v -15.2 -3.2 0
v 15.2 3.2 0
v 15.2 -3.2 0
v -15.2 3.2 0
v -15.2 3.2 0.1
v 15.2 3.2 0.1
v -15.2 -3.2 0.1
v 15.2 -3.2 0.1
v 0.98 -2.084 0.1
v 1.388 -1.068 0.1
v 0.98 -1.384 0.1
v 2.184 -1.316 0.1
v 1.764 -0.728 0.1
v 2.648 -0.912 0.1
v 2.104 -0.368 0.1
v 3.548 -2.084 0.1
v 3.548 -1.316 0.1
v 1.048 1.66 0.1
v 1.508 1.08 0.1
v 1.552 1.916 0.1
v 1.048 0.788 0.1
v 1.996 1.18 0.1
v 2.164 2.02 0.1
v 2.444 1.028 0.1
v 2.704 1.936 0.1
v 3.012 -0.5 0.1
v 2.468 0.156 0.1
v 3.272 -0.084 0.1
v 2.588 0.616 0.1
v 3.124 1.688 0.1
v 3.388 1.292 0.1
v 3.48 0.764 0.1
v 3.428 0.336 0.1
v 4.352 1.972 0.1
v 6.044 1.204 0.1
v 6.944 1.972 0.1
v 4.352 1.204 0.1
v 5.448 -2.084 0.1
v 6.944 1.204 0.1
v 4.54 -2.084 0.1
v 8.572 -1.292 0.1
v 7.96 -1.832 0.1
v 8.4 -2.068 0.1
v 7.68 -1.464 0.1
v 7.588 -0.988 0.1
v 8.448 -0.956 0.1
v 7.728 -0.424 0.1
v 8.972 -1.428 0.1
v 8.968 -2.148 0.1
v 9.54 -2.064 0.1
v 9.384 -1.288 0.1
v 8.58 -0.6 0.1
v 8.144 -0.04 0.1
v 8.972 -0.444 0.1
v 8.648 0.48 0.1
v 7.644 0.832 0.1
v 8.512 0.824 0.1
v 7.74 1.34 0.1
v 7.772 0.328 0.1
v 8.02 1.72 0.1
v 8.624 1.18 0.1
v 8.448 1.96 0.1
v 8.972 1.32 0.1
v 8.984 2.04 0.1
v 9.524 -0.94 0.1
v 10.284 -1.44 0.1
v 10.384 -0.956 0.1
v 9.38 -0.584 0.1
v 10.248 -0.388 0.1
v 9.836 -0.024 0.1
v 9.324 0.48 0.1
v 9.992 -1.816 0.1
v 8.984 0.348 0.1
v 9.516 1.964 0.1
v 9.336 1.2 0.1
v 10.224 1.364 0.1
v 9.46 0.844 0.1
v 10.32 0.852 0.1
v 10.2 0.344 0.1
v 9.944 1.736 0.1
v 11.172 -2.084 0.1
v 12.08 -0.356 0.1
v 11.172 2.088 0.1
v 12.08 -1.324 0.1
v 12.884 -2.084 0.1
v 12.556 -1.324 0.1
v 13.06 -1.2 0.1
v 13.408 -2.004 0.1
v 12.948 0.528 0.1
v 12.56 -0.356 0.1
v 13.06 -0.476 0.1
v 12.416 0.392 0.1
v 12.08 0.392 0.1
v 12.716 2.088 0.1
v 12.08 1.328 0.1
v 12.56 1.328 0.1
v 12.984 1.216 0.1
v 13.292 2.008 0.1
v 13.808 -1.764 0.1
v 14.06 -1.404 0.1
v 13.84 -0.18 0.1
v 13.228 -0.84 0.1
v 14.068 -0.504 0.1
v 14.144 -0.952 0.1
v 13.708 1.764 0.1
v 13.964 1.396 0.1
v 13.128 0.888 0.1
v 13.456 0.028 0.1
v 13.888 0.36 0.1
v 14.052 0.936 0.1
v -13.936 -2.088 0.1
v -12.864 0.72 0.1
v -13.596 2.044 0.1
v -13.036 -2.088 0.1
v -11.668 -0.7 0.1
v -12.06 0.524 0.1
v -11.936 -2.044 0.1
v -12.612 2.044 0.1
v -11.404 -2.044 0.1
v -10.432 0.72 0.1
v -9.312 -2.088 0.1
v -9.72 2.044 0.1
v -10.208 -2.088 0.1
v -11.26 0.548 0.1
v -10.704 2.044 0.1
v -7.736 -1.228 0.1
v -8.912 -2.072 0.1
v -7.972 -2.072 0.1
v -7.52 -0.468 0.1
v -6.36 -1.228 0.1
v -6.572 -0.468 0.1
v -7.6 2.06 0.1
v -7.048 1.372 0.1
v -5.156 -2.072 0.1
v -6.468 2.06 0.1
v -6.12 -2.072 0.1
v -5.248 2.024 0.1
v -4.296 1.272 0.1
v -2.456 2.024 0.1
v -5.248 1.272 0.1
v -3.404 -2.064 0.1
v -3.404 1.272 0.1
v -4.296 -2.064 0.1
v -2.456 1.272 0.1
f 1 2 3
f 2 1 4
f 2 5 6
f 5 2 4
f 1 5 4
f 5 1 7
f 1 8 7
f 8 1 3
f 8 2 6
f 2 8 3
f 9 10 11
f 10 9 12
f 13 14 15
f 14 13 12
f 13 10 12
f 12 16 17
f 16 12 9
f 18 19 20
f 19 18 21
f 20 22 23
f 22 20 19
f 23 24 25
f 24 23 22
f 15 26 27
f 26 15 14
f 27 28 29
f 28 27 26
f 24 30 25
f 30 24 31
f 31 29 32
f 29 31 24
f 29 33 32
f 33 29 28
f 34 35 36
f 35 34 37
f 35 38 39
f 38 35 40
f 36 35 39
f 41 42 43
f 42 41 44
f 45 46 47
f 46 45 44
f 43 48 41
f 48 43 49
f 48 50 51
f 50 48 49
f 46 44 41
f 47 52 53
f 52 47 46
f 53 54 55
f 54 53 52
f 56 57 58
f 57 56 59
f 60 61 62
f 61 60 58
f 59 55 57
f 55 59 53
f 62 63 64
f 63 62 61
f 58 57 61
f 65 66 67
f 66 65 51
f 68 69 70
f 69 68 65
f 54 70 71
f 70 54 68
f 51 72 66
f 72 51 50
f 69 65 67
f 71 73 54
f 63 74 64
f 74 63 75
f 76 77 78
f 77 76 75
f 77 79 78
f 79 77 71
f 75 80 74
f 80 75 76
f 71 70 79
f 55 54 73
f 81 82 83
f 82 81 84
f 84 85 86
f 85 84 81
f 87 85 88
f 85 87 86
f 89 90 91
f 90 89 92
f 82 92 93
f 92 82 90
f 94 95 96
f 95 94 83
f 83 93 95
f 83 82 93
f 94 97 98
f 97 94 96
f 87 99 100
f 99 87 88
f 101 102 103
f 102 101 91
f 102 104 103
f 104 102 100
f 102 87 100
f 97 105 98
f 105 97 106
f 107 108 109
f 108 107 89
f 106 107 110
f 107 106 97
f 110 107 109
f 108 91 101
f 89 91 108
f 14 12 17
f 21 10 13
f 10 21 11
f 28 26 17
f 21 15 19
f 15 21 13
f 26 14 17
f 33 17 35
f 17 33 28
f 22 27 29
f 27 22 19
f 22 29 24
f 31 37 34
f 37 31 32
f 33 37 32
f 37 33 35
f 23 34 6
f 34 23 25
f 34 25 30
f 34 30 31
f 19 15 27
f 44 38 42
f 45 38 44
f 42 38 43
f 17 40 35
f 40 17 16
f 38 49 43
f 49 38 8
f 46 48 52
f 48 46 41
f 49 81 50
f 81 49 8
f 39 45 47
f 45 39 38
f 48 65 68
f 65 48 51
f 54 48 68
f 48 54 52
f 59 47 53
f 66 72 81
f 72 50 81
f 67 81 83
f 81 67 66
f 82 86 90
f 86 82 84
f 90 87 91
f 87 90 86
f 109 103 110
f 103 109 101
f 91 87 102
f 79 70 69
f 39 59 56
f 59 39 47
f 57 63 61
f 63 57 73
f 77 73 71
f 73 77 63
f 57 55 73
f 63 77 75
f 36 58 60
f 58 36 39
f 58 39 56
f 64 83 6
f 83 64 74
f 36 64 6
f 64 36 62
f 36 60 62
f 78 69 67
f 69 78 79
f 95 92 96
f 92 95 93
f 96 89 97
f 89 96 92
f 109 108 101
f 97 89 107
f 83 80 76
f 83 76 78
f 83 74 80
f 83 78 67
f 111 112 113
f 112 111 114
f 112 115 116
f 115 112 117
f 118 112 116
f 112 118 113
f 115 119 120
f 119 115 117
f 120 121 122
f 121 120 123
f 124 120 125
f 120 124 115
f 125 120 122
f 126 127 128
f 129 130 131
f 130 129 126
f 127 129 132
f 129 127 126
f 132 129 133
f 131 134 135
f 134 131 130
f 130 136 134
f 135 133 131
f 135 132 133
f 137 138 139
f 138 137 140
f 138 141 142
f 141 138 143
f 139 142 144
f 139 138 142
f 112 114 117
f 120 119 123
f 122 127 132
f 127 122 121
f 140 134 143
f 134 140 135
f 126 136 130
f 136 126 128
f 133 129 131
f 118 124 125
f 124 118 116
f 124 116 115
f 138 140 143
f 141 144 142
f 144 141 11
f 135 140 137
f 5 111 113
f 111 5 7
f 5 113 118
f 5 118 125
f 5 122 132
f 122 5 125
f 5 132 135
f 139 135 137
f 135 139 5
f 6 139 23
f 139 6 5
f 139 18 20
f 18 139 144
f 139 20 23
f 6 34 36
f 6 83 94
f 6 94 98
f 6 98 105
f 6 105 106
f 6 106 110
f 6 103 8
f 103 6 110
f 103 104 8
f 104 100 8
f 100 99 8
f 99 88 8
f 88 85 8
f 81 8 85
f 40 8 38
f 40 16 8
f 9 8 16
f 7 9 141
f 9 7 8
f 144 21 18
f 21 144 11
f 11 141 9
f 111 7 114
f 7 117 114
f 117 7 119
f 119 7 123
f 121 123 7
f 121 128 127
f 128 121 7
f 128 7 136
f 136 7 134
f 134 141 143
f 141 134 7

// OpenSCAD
// file: ../p/box5-12.scad
use <../lib.scad>
function ldraw_lib__box5_12() = [
// 0 Box with 5 Faces without Any Edges
// 0 Name: box5-12.dat
// 0 Author: Chris Dee [cwdee]
// 0 !LDRAW_ORG Primitive UPDATE 2009-02
// 0 !LICENSE Licensed under CC BY 2.0 and CC BY 4.0 : see CAreadme.txt
// 
// 0 BFC CERTIFY CCW
  [0,"BFC","CERTIFY"],
  [0,"BFC","CCW"],
// 
// 0 !HISTORY 2009-09-03 [PTadmin] Official Update 2009-02
// 
// 
// 4 16 1 1 1 1 1 -1 -1 1 -1 -1 1 1
  [4,16,1,1,1,1,1,-1,-1,1,-1,-1,1,1],
// 4 16 -1 0 1 1 0 1 1 1 1 -1 1 1
  [4,16,-1,0,1,1,0,1,1,1,1,-1,1,1],
// 4 16 -1 0 -1 -1 0 1 -1 1 1 -1 1 -1
  [4,16,-1,0,-1,-1,0,1,-1,1,1,-1,1,-1],
// 4 16 1 0 -1 -1 0 -1 -1 1 -1 1 1 -1
  [4,16,1,0,-1,-1,0,-1,-1,1,-1,1,1,-1],
// 4 16 1 0 1 1 0 -1 1 1 -1 1 1 1
  [4,16,1,0,1,1,0,-1,1,1,-1,1,1,1],
// 0
];
makepoly(ldraw_lib__box5_12(), line=0.2);
// main file
use <../lib.scad>
use <../p/box5-12.scad>
function ldraw_lib__6153754i() = [
// 0 Sticker  0.8 x  3.8 with White "MAT 278B" on Black Background
// 0 Name: 6153754i.dat
// 0 Author: Magnus Forsberg [MagFors]
// 0 !LDRAW_ORG Part UPDATE 2016-01
// 0 !LICENSE Licensed under CC BY 2.0 and CC BY 4.0 : see CAreadme.txt
// 
// 0 BFC CERTIFY CCW
  [0,"BFC","CERTIFY"],
  [0,"BFC","CCW"],
// 
// 0 !KEYWORDS Beetle, set 10252, Volkswagen, VW
// 
// 0 !HISTORY 2016-12-31 [PTadmin] Official Update 2016-01
// 
// 
// 1 16 0 -0.25 0 38 0 0 0 0.25 0 0 0 8 box5-12.dat
  [1,16,0,-0.25,0,38,0,0,0,0.25,0,0,0,8, ldraw_lib__box5_12()],
// 4 15 3.47 -0.25 -2.67 2.45 -0.25 -3.46 2.45 -0.25 -5.21 5.46 -0.25 -3.29
  [4,15,3.47,-0.25,-2.67,2.45,-0.25,-3.46,2.45,-0.25,-5.21,5.46,-0.25,-3.29],
// 4 15 6.62 -0.25 -2.28 5.26 -0.25 -0.92 4.41 -0.25 -1.82 5.46 -0.25 -3.29
  [4,15,6.62,-0.25,-2.28,5.26,-0.25,-0.92,4.41,-0.25,-1.82,5.46,-0.25,-3.29],
// 3 15 4.41 -0.25 -1.82 3.47 -0.25 -2.67 5.46 -0.25 -3.29
  [3,15,4.41,-0.25,-1.82,3.47,-0.25,-2.67,5.46,-0.25,-3.29],
// 4 15 5.46 -0.25 -3.29 2.45 -0.25 -5.21 8.87 -0.25 -5.21 8.87 -0.25 -3.29
  [4,15,5.46,-0.25,-3.29,2.45,-0.25,-5.21,8.87,-0.25,-5.21,8.87,-0.25,-3.29],
// 4 15 2.62 -0.25 4.15 2.62 -0.25 1.97 3.77 -0.25 2.7 3.88 -0.25 4.79
  [4,15,2.62,-0.25,4.15,2.62,-0.25,1.97,3.77,-0.25,2.7,3.88,-0.25,4.79],
// 4 15 4.99 -0.25 2.95 5.41 -0.25 5.05 3.88 -0.25 4.79 3.77 -0.25 2.7
  [4,15,4.99,-0.25,2.95,5.41,-0.25,5.05,3.88,-0.25,4.79,3.77,-0.25,2.7],
// 4 15 5.41 -0.25 5.05 4.99 -0.25 2.95 6.11 -0.25 2.57 6.76 -0.25 4.84
  [4,15,5.41,-0.25,5.05,4.99,-0.25,2.95,6.11,-0.25,2.57,6.76,-0.25,4.84],
// 4 15 7.53 -0.25 -1.25 6.17 -0.25 0.39 5.26 -0.25 -0.92 6.62 -0.25 -2.28
  [4,15,7.53,-0.25,-1.25,6.17,-0.25,0.39,5.26,-0.25,-0.92,6.62,-0.25,-2.28],
// 4 15 6.17 -0.25 0.39 7.53 -0.25 -1.25 8.18 -0.25 -0.21 6.47 -0.25 1.54
  [4,15,6.17,-0.25,0.39,7.53,-0.25,-1.25,8.18,-0.25,-0.21,6.47,-0.25,1.54],
// 4 15 7.81 -0.25 4.22 6.76 -0.25 4.84 6.11 -0.25 2.57 8.47 -0.25 3.23
  [4,15,7.81,-0.25,4.22,6.76,-0.25,4.84,6.11,-0.25,2.57,8.47,-0.25,3.23],
// 4 15 8.47 -0.25 3.23 6.11 -0.25 2.57 6.47 -0.25 1.54 8.7 -0.25 1.91
  [4,15,8.47,-0.25,3.23,6.11,-0.25,2.57,6.47,-0.25,1.54,8.7,-0.25,1.91],
// 4 15 8.57 -0.25 0.84 8.7 -0.25 1.91 6.47 -0.25 1.54 8.18 -0.25 -0.21
  [4,15,8.57,-0.25,0.84,8.7,-0.25,1.91,6.47,-0.25,1.54,8.18,-0.25,-0.21],
// 4 15 10.88 -0.25 4.93 10.88 -0.25 3.01 15.11 -0.25 3.01 17.36 -0.25 4.93
  [4,15,10.88,-0.25,4.93,10.88,-0.25,3.01,15.11,-0.25,3.01,17.36,-0.25,4.93],
// 4 15 15.11 -0.25 3.01 11.35 -0.25 -5.21 13.62 -0.25 -5.21 17.36 -0.25 3.01
  [4,15,15.11,-0.25,3.01,11.35,-0.25,-5.21,13.62,-0.25,-5.21,17.36,-0.25,3.01],
// 3 15 17.36 -0.25 4.93 15.11 -0.25 3.01 17.36 -0.25 3.01
  [3,15,17.36,-0.25,4.93,15.11,-0.25,3.01,17.36,-0.25,3.01],
// 4 15 21.43 -0.25 -3.23 19.2 -0.25 -3.66 19.9 -0.25 -4.58 21 -0.25 -5.17
  [4,15,21.43,-0.25,-3.23,19.2,-0.25,-3.66,19.9,-0.25,-4.58,21,-0.25,-5.17],
// 4 15 18.97 -0.25 -2.47 19.2 -0.25 -3.66 21.12 -0.25 -2.39 19.32 -0.25 -1.06
  [4,15,18.97,-0.25,-2.47,19.2,-0.25,-3.66,21.12,-0.25,-2.39,19.32,-0.25,-1.06],
// 4 15 22.43 -0.25 -3.57 21.43 -0.25 -3.23 21 -0.25 -5.17 22.42 -0.25 -5.37
  [4,15,22.43,-0.25,-3.57,21.43,-0.25,-3.23,21,-0.25,-5.17,22.42,-0.25,-5.37],
// 4 15 22.43 -0.25 -3.57 22.42 -0.25 -5.37 23.85 -0.25 -5.16 23.46 -0.25 -3.22
  [4,15,22.43,-0.25,-3.57,22.42,-0.25,-5.37,23.85,-0.25,-5.16,23.46,-0.25,-3.22],
// 3 15 21.12 -0.25 -2.39 19.2 -0.25 -3.66 21.43 -0.25 -3.23
  [3,15,21.12,-0.25,-2.39,19.2,-0.25,-3.66,21.43,-0.25,-3.23],
// 4 15 19.32 -0.25 -1.06 21.12 -0.25 -2.39 21.45 -0.25 -1.5 20.36 -0.25 -0.1
  [4,15,19.32,-0.25,-1.06,21.12,-0.25,-2.39,21.45,-0.25,-1.5,20.36,-0.25,-0.1],
// 4 15 20.36 -0.25 -0.1 21.45 -0.25 -1.5 22.43 -0.25 -1.11 21.62 -0.25 1.2
  [4,15,20.36,-0.25,-0.1,21.45,-0.25,-1.5,22.43,-0.25,-1.11,21.62,-0.25,1.2],
// 4 15 19.11 -0.25 2.08 19.43 -0.25 0.82 21.28 -0.25 2.06 19.35 -0.25 3.35
  [4,15,19.11,-0.25,2.08,19.43,-0.25,0.82,21.28,-0.25,2.06,19.35,-0.25,3.35],
// 4 15 20.05 -0.25 4.3 19.35 -0.25 3.35 21.56 -0.25 2.95 21.12 -0.25 4.9
  [4,15,20.05,-0.25,4.3,19.35,-0.25,3.35,21.56,-0.25,2.95,21.12,-0.25,4.9],
// 4 15 19.43 -0.25 0.82 20.36 -0.25 -0.1 21.62 -0.25 1.2 21.28 -0.25 2.06
  [4,15,19.43,-0.25,0.82,20.36,-0.25,-0.1,21.62,-0.25,1.2,21.28,-0.25,2.06],
// 4 15 21.12 -0.25 4.9 21.56 -0.25 2.95 22.43 -0.25 3.3 22.46 -0.25 5.1
  [4,15,21.12,-0.25,4.9,21.56,-0.25,2.95,22.43,-0.25,3.3,22.46,-0.25,5.1],
// 3 15 19.35 -0.25 3.35 21.28 -0.25 2.06 21.56 -0.25 2.95
  [3,15,19.35,-0.25,3.35,21.28,-0.25,2.06,21.56,-0.25,2.95],
// 4 15 23.81 -0.25 -2.35 23.46 -0.25 -3.22 25.71 -0.25 -3.6 25.96 -0.25 -2.39
  [4,15,23.81,-0.25,-2.35,23.46,-0.25,-3.22,25.71,-0.25,-3.6,25.96,-0.25,-2.39],
// 4 15 23.45 -0.25 -1.46 23.81 -0.25 -2.35 25.62 -0.25 -0.97 24.59 -0.25 -0.06
  [4,15,23.45,-0.25,-1.46,23.81,-0.25,-2.35,25.62,-0.25,-0.97,24.59,-0.25,-0.06],
// 4 15 23.31 -0.25 1.2 22.43 -0.25 -1.11 23.45 -0.25 -1.46 24.59 -0.25 -0.06
  [4,15,23.31,-0.25,1.2,22.43,-0.25,-1.11,23.45,-0.25,-1.46,24.59,-0.25,-0.06],
// 4 15 23.46 -0.25 -3.22 23.85 -0.25 -5.16 24.98 -0.25 -4.54 25.71 -0.25 -3.6
  [4,15,23.46,-0.25,-3.22,23.85,-0.25,-5.16,24.98,-0.25,-4.54,25.71,-0.25,-3.6],
// 3 15 25.62 -0.25 -0.97 23.81 -0.25 -2.35 25.96 -0.25 -2.39
  [3,15,25.62,-0.25,-0.97,23.81,-0.25,-2.35,25.96,-0.25,-2.39],
// 3 15 23.31 -0.25 1.2 22.46 -0.25 0.87 22.43 -0.25 -1.11
  [3,15,23.31,-0.25,1.2,22.46,-0.25,0.87,22.43,-0.25,-1.11],
// 4 15 22.43 -0.25 3.3 23.34 -0.25 3 23.79 -0.25 4.91 22.46 -0.25 5.1
  [4,15,22.43,-0.25,3.3,23.34,-0.25,3,23.79,-0.25,4.91,22.46,-0.25,5.1],
// 4 15 25.56 -0.25 3.41 23.34 -0.25 3 23.65 -0.25 2.11 25.8 -0.25 2.13
  [4,15,25.56,-0.25,3.41,23.34,-0.25,3,23.65,-0.25,2.11,25.8,-0.25,2.13],
// 4 15 23.65 -0.25 2.11 23.31 -0.25 1.2 25.5 -0.25 0.86 25.8 -0.25 2.13
  [4,15,23.65,-0.25,2.11,23.31,-0.25,1.2,25.5,-0.25,0.86,25.8,-0.25,2.13],
// 4 15 24.86 -0.25 4.34 23.79 -0.25 4.91 23.34 -0.25 3 25.56 -0.25 3.41
  [4,15,24.86,-0.25,4.34,23.79,-0.25,4.91,23.34,-0.25,3,25.56,-0.25,3.41],
// 3 15 23.31 -0.25 1.2 24.59 -0.25 -0.06 25.5 -0.25 0.86
  [3,15,23.31,-0.25,1.2,24.59,-0.25,-0.06,25.5,-0.25,0.86],
// 3 15 21.62 -0.25 1.2 22.43 -0.25 -1.11 22.46 -0.25 0.87
  [3,15,21.62,-0.25,1.2,22.43,-0.25,-1.11,22.46,-0.25,0.87],
// 4 15 27.93 -0.25 -5.21 30.2 -0.25 -3.31 30.2 -0.25 -0.89 27.93 -0.25 5.22
  [4,15,27.93,-0.25,-5.21,30.2,-0.25,-3.31,30.2,-0.25,-0.89,27.93,-0.25,5.22],
// 4 15 30.2 -0.25 -3.31 27.93 -0.25 -5.21 32.21 -0.25 -5.21 31.39 -0.25 -3.31
  [4,15,30.2,-0.25,-3.31,27.93,-0.25,-5.21,32.21,-0.25,-5.21,31.39,-0.25,-3.31],
// 4 15 32.65 -0.25 -3 31.39 -0.25 -3.31 32.21 -0.25 -5.21 33.52 -0.25 -5.01
  [4,15,32.65,-0.25,-3,31.39,-0.25,-3.31,32.21,-0.25,-5.21,33.52,-0.25,-5.01],
// 4 15 31.4 -0.25 -0.89 32.65 -0.25 -1.19 32.37 -0.25 1.32 31.04 -0.25 0.98
  [4,15,31.4,-0.25,-0.89,32.65,-0.25,-1.19,32.37,-0.25,1.32,31.04,-0.25,0.98],
// 4 15 30.2 -0.25 -0.89 31.4 -0.25 -0.89 31.04 -0.25 0.98 30.2 -0.25 0.98
  [4,15,30.2,-0.25,-0.89,31.4,-0.25,-0.89,31.04,-0.25,0.98,30.2,-0.25,0.98],
// 4 15 31.79 -0.25 5.22 27.93 -0.25 5.22 30.2 -0.25 3.32 31.4 -0.25 3.32
  [4,15,31.79,-0.25,5.22,27.93,-0.25,5.22,30.2,-0.25,3.32,31.4,-0.25,3.32],
// 3 15 27.93 -0.25 5.22 30.2 -0.25 0.98 30.2 -0.25 3.32
  [3,15,27.93,-0.25,5.22,30.2,-0.25,0.98,30.2,-0.25,3.32],
// 3 15 27.93 -0.25 5.22 30.2 -0.25 -0.89 30.2 -0.25 0.98
  [3,15,27.93,-0.25,5.22,30.2,-0.25,-0.89,30.2,-0.25,0.98],
// 4 15 31.79 -0.25 5.22 31.4 -0.25 3.32 32.46 -0.25 3.04 33.23 -0.25 5.02
  [4,15,31.79,-0.25,5.22,31.4,-0.25,3.32,32.46,-0.25,3.04,33.23,-0.25,5.02],
// 4 15 32.65 -0.25 -3 33.52 -0.25 -5.01 34.52 -0.25 -4.41 35.15 -0.25 -3.51
  [4,15,32.65,-0.25,-3,33.52,-0.25,-5.01,34.52,-0.25,-4.41,35.15,-0.25,-3.51],
// 4 15 34.6 -0.25 -0.45 32.65 -0.25 -1.19 33.07 -0.25 -2.1 35.17 -0.25 -1.26
  [4,15,34.6,-0.25,-0.45,32.65,-0.25,-1.19,33.07,-0.25,-2.1,35.17,-0.25,-1.26],
// 4 15 33.07 -0.25 -2.1 35.15 -0.25 -3.51 35.36 -0.25 -2.38 35.17 -0.25 -1.26
  [4,15,33.07,-0.25,-2.1,35.15,-0.25,-3.51,35.36,-0.25,-2.38,35.17,-0.25,-1.26],
// 3 15 33.07 -0.25 -2.1 32.65 -0.25 -3 35.15 -0.25 -3.51
  [3,15,33.07,-0.25,-2.1,32.65,-0.25,-3,35.15,-0.25,-3.51],
// 4 15 32.46 -0.25 3.04 34.91 -0.25 3.49 34.27 -0.25 4.41 33.23 -0.25 5.02
  [4,15,32.46,-0.25,3.04,34.91,-0.25,3.49,34.27,-0.25,4.41,33.23,-0.25,5.02],
// 4 15 32.82 -0.25 2.22 32.37 -0.25 1.32 33.64 -0.25 0.07 34.72 -0.25 0.9
  [4,15,32.82,-0.25,2.22,32.37,-0.25,1.32,33.64,-0.25,0.07,34.72,-0.25,0.9],
// 4 15 34.91 -0.25 3.49 32.46 -0.25 3.04 32.82 -0.25 2.22 35.13 -0.25 2.34
  [4,15,34.91,-0.25,3.49,32.46,-0.25,3.04,32.82,-0.25,2.22,35.13,-0.25,2.34],
// 3 15 35.13 -0.25 2.34 32.82 -0.25 2.22 34.72 -0.25 0.9
  [3,15,35.13,-0.25,2.34,32.82,-0.25,2.22,34.72,-0.25,0.9],
// 3 15 33.64 -0.25 0.07 32.65 -0.25 -1.19 34.6 -0.25 -0.45
  [3,15,33.64,-0.25,0.07,32.65,-0.25,-1.19,34.6,-0.25,-0.45],
// 3 15 32.37 -0.25 1.32 32.65 -0.25 -1.19 33.64 -0.25 0.07
  [3,15,32.37,-0.25,1.32,32.65,-0.25,-1.19,33.64,-0.25,0.07],
// 3 0 6.62 -0.25 -2.28 5.46 -0.25 -3.29 8.87 -0.25 -3.29
  [3,0,6.62,-0.25,-2.28,5.46,-0.25,-3.29,8.87,-0.25,-3.29],
// 4 0 3.47 -0.25 -2.67 4.41 -0.25 -1.82 2.62 -0.25 1.97 2.45 -0.25 -3.46
  [4,0,3.47,-0.25,-2.67,4.41,-0.25,-1.82,2.62,-0.25,1.97,2.45,-0.25,-3.46],
// 3 0 8.18 -0.25 -0.21 7.53 -0.25 -1.25 8.87 -0.25 -3.29
  [3,0,8.18,-0.25,-0.21,7.53,-0.25,-1.25,8.87,-0.25,-3.29],
// 4 0 2.62 -0.25 1.97 4.41 -0.25 -1.82 5.26 -0.25 -0.92 3.77 -0.25 2.7
  [4,0,2.62,-0.25,1.97,4.41,-0.25,-1.82,5.26,-0.25,-0.92,3.77,-0.25,2.7],
// 3 0 7.53 -0.25 -1.25 6.62 -0.25 -2.28 8.87 -0.25 -3.29
  [3,0,7.53,-0.25,-1.25,6.62,-0.25,-2.28,8.87,-0.25,-3.29],
// 4 0 8.57 -0.25 0.84 8.18 -0.25 -0.21 8.87 -0.25 -3.29 15.11 -0.25 3.01
  [4,0,8.57,-0.25,0.84,8.18,-0.25,-0.21,8.87,-0.25,-3.29,15.11,-0.25,3.01],
// 4 0 4.99 -0.25 2.95 3.77 -0.25 2.7 6.17 -0.25 0.39 6.47 -0.25 1.54
  [4,0,4.99,-0.25,2.95,3.77,-0.25,2.7,6.17,-0.25,0.39,6.47,-0.25,1.54],
// 3 0 4.99 -0.25 2.95 6.47 -0.25 1.54 6.11 -0.25 2.57
  [3,0,4.99,-0.25,2.95,6.47,-0.25,1.54,6.11,-0.25,2.57],
// 4 0 8.47 -0.25 3.23 8.7 -0.25 1.91 10.88 -0.25 3.01 10.88 -0.25 4.93
  [4,0,8.47,-0.25,3.23,8.7,-0.25,1.91,10.88,-0.25,3.01,10.88,-0.25,4.93],
// 4 0 10.88 -0.25 3.01 8.7 -0.25 1.91 8.57 -0.25 0.84 15.11 -0.25 3.01
  [4,0,10.88,-0.25,3.01,8.7,-0.25,1.91,8.57,-0.25,0.84,15.11,-0.25,3.01],
// 
// 4 0 5.41 -0.25 5.05 6.76 -0.25 4.84 10.88 -0.25 4.93 38 -0.25 8
  [4,0,5.41,-0.25,5.05,6.76,-0.25,4.84,10.88,-0.25,4.93,38,-0.25,8],
// 3 0 10.88 -0.25 4.93 6.76 -0.25 4.84 7.81 -0.25 4.22
  [3,0,10.88,-0.25,4.93,6.76,-0.25,4.84,7.81,-0.25,4.22],
// 3 0 10.88 -0.25 4.93 7.81 -0.25 4.22 8.47 -0.25 3.23
  [3,0,10.88,-0.25,4.93,7.81,-0.25,4.22,8.47,-0.25,3.23],
// 3 0 3.77 -0.25 2.7 5.26 -0.25 -0.92 6.17 -0.25 0.39
  [3,0,3.77,-0.25,2.7,5.26,-0.25,-0.92,6.17,-0.25,0.39],
// 3 0 19.2 -0.25 -3.66 13.62 -0.25 -5.21 19.9 -0.25 -4.58
  [3,0,19.2,-0.25,-3.66,13.62,-0.25,-5.21,19.9,-0.25,-4.58],
// 3 0 18.97 -0.25 -2.47 13.62 -0.25 -5.21 19.2 -0.25 -3.66
  [3,0,18.97,-0.25,-2.47,13.62,-0.25,-5.21,19.2,-0.25,-3.66],
// 3 0 19.9 -0.25 -4.58 13.62 -0.25 -5.21 21 -0.25 -5.17
  [3,0,19.9,-0.25,-4.58,13.62,-0.25,-5.21,21,-0.25,-5.17],
// 4 0 8.87 -0.25 -3.29 8.87 -0.25 -5.21 11.35 -0.25 -5.21 15.11 -0.25 3.01
  [4,0,8.87,-0.25,-3.29,8.87,-0.25,-5.21,11.35,-0.25,-5.21,15.11,-0.25,3.01],
// 4 0 22.42 -0.25 -5.37 21 -0.25 -5.17 13.62 -0.25 -5.21 38 -0.25 -8
  [4,0,22.42,-0.25,-5.37,21,-0.25,-5.17,13.62,-0.25,-5.21,38,-0.25,-8],
// 4 0 21.12 -0.25 -2.39 21.43 -0.25 -3.23 22.43 -0.25 -3.57 21.45 -0.25 -1.5
  [4,0,21.12,-0.25,-2.39,21.43,-0.25,-3.23,22.43,-0.25,-3.57,21.45,-0.25,-1.5],
// 4 0 27.93 -0.25 -5.21 23.85 -0.25 -5.16 22.42 -0.25 -5.37 38 -0.25 -8
  [4,0,27.93,-0.25,-5.21,23.85,-0.25,-5.16,22.42,-0.25,-5.37,38,-0.25,-8],
// 4 0 19.32 -0.25 -1.06 17.36 -0.25 3.01 13.62 -0.25 -5.21 18.97 -0.25 -2.47
  [4,0,19.32,-0.25,-1.06,17.36,-0.25,3.01,13.62,-0.25,-5.21,18.97,-0.25,-2.47],
// 4 0 23.46 -0.25 -3.22 23.81 -0.25 -2.35 23.45 -0.25 -1.46 22.43 -0.25 -3.57
  [4,0,23.46,-0.25,-3.22,23.81,-0.25,-2.35,23.45,-0.25,-1.46,22.43,-0.25,-3.57],
// 4 0 22.43 -0.25 -3.57 23.45 -0.25 -1.46 22.43 -0.25 -1.11 21.45 -0.25 -1.5
  [4,0,22.43,-0.25,-3.57,23.45,-0.25,-1.46,22.43,-0.25,-1.11,21.45,-0.25,-1.5],
// 3 0 19.43 -0.25 0.82 19.32 -0.25 -1.06 20.36 -0.25 -0.1
  [3,0,19.43,-0.25,0.82,19.32,-0.25,-1.06,20.36,-0.25,-0.1],
// 3 0 25.71 -0.25 -3.6 24.98 -0.25 -4.54 27.93 -0.25 -5.21
  [3,0,25.71,-0.25,-3.6,24.98,-0.25,-4.54,27.93,-0.25,-5.21],
// 3 0 24.98 -0.25 -4.54 23.85 -0.25 -5.16 27.93 -0.25 -5.21
  [3,0,24.98,-0.25,-4.54,23.85,-0.25,-5.16,27.93,-0.25,-5.21],
// 4 0 25.96 -0.25 -2.39 25.71 -0.25 -3.6 27.93 -0.25 -5.21 27.93 -0.25 5.22
  [4,0,25.96,-0.25,-2.39,25.71,-0.25,-3.6,27.93,-0.25,-5.21,27.93,-0.25,5.22],
// 4 0 30.2 -0.25 -0.89 30.2 -0.25 -3.31 31.39 -0.25 -3.31 31.4 -0.25 -0.89
  [4,0,30.2,-0.25,-0.89,30.2,-0.25,-3.31,31.39,-0.25,-3.31,31.4,-0.25,-0.89],
// 4 0 31.4 -0.25 -0.89 31.39 -0.25 -3.31 32.65 -0.25 -3 32.65 -0.25 -1.19
  [4,0,31.4,-0.25,-0.89,31.39,-0.25,-3.31,32.65,-0.25,-3,32.65,-0.25,-1.19],
// 4 0 34.72 -0.25 0.9 34.6 -0.25 -0.45 35.17 -0.25 -1.26 35.13 -0.25 2.34
  [4,0,34.72,-0.25,0.9,34.6,-0.25,-0.45,35.17,-0.25,-1.26,35.13,-0.25,2.34],
// 3 0 32.65 -0.25 -1.19 32.65 -0.25 -3 33.07 -0.25 -2.1
  [3,0,32.65,-0.25,-1.19,32.65,-0.25,-3,33.07,-0.25,-2.1],
// 3 0 25.5 -0.25 0.86 24.59 -0.25 -0.06 25.62 -0.25 -0.97
  [3,0,25.5,-0.25,0.86,24.59,-0.25,-0.06,25.62,-0.25,-0.97],
// 4 0 19.43 -0.25 0.82 19.11 -0.25 2.08 17.36 -0.25 3.01 19.32 -0.25 -1.06
  [4,0,19.43,-0.25,0.82,19.11,-0.25,2.08,17.36,-0.25,3.01,19.32,-0.25,-1.06],
// 4 0 22.43 -0.25 3.3 21.56 -0.25 2.95 21.28 -0.25 2.06 22.46 -0.25 0.87
  [4,0,22.43,-0.25,3.3,21.56,-0.25,2.95,21.28,-0.25,2.06,22.46,-0.25,0.87],
// 4 0 23.65 -0.25 2.11 22.43 -0.25 3.3 22.46 -0.25 0.87 23.31 -0.25 1.2
  [4,0,23.65,-0.25,2.11,22.43,-0.25,3.3,22.46,-0.25,0.87,23.31,-0.25,1.2],
// 3 0 21.28 -0.25 2.06 21.62 -0.25 1.2 22.46 -0.25 0.87
  [3,0,21.28,-0.25,2.06,21.62,-0.25,1.2,22.46,-0.25,0.87],
// 3 0 22.43 -0.25 3.3 23.65 -0.25 2.11 23.34 -0.25 3
  [3,0,22.43,-0.25,3.3,23.65,-0.25,2.11,23.34,-0.25,3],
// 4 0 17.36 -0.25 4.93 17.36 -0.25 3.01 19.35 -0.25 3.35 20.05 -0.25 4.3
  [4,0,17.36,-0.25,4.93,17.36,-0.25,3.01,19.35,-0.25,3.35,20.05,-0.25,4.3],
// 3 0 19.35 -0.25 3.35 17.36 -0.25 3.01 19.11 -0.25 2.08
  [3,0,19.35,-0.25,3.35,17.36,-0.25,3.01,19.11,-0.25,2.08],
// 4 0 22.46 -0.25 5.1 23.79 -0.25 4.91 27.93 -0.25 5.22 38 -0.25 8
  [4,0,22.46,-0.25,5.1,23.79,-0.25,4.91,27.93,-0.25,5.22,38,-0.25,8],
// 4 0 17.36 -0.25 4.93 21.12 -0.25 4.9 22.46 -0.25 5.1 38 -0.25 8
  [4,0,17.36,-0.25,4.93,21.12,-0.25,4.9,22.46,-0.25,5.1,38,-0.25,8],
// 3 0 17.36 -0.25 4.93 20.05 -0.25 4.3 21.12 -0.25 4.9
  [3,0,17.36,-0.25,4.93,20.05,-0.25,4.3,21.12,-0.25,4.9],
// 4 0 25.8 -0.25 2.13 25.5 -0.25 0.86 25.62 -0.25 -0.97 25.96 -0.25 -2.39
  [4,0,25.8,-0.25,2.13,25.5,-0.25,0.86,25.62,-0.25,-0.97,25.96,-0.25,-2.39],
// 4 0 30.2 -0.25 3.32 30.2 -0.25 0.98 31.04 -0.25 0.98 31.4 -0.25 3.32
  [4,0,30.2,-0.25,3.32,30.2,-0.25,0.98,31.04,-0.25,0.98,31.4,-0.25,3.32],
// 4 0 31.4 -0.25 3.32 31.04 -0.25 0.98 32.37 -0.25 1.32 32.46 -0.25 3.04
  [4,0,31.4,-0.25,3.32,31.04,-0.25,0.98,32.37,-0.25,1.32,32.46,-0.25,3.04],
// 3 0 34.72 -0.25 0.9 33.64 -0.25 0.07 34.6 -0.25 -0.45
  [3,0,34.72,-0.25,0.9,33.64,-0.25,0.07,34.6,-0.25,-0.45],
// 3 0 32.46 -0.25 3.04 32.37 -0.25 1.32 32.82 -0.25 2.22
  [3,0,32.46,-0.25,3.04,32.37,-0.25,1.32,32.82,-0.25,2.22],
// 3 0 27.93 -0.25 5.22 24.86 -0.25 4.34 25.56 -0.25 3.41
  [3,0,27.93,-0.25,5.22,24.86,-0.25,4.34,25.56,-0.25,3.41],
// 3 0 27.93 -0.25 5.22 25.56 -0.25 3.41 25.8 -0.25 2.13
  [3,0,27.93,-0.25,5.22,25.56,-0.25,3.41,25.8,-0.25,2.13],
// 3 0 27.93 -0.25 5.22 23.79 -0.25 4.91 24.86 -0.25 4.34
  [3,0,27.93,-0.25,5.22,23.79,-0.25,4.91,24.86,-0.25,4.34],
// 3 0 27.93 -0.25 5.22 25.8 -0.25 2.13 25.96 -0.25 -2.39
  [3,0,27.93,-0.25,5.22,25.8,-0.25,2.13,25.96,-0.25,-2.39],
// 4 15 -34.84 -0.25 -5.22 -32.59 -0.25 -5.22 -32.16 -0.25 1.8 -33.99 -0.25 5.11
  [4,15,-34.84,-0.25,-5.22,-32.59,-0.25,-5.22,-32.16,-0.25,1.8,-33.99,-0.25,5.11],
// 4 15 -32.16 -0.25 1.8 -29.84 -0.25 -5.11 -29.17 -0.25 -1.75 -30.15 -0.25 1.31
  [4,15,-32.16,-0.25,1.8,-29.84,-0.25,-5.11,-29.17,-0.25,-1.75,-30.15,-0.25,1.31],
// 4 15 -31.53 -0.25 5.11 -33.99 -0.25 5.11 -32.16 -0.25 1.8 -30.15 -0.25 1.31
  [4,15,-31.53,-0.25,5.11,-33.99,-0.25,5.11,-32.16,-0.25,1.8,-30.15,-0.25,1.31],
// 4 15 -29.17 -0.25 -1.75 -29.84 -0.25 -5.11 -28.51 -0.25 -5.11 -26.08 -0.25 1.8
  [4,15,-29.17,-0.25,-1.75,-29.84,-0.25,-5.11,-28.51,-0.25,-5.11,-26.08,-0.25,1.8],
// 4 15 -26.08 -0.25 1.8 -25.52 -0.25 -5.22 -23.28 -0.25 -5.22 -24.3 -0.25 5.11
  [4,15,-26.08,-0.25,1.8,-25.52,-0.25,-5.22,-23.28,-0.25,-5.22,-24.3,-0.25,5.11],
// 4 15 -26.08 -0.25 1.8 -26.76 -0.25 5.11 -28.15 -0.25 1.37 -29.17 -0.25 -1.75
  [4,15,-26.08,-0.25,1.8,-26.76,-0.25,5.11,-28.15,-0.25,1.37,-29.17,-0.25,-1.75],
// 3 15 -26.76 -0.25 5.11 -26.08 -0.25 1.8 -24.3 -0.25 5.11
  [3,15,-26.76,-0.25,5.11,-26.08,-0.25,1.8,-24.3,-0.25,5.11],
// 3 15 -19.34 -0.25 -3.07 -22.28 -0.25 -5.18 -19.93 -0.25 -5.18
  [3,15,-19.34,-0.25,-3.07,-22.28,-0.25,-5.18,-19.93,-0.25,-5.18],
// 4 15 -18.8 -0.25 -1.17 -19.34 -0.25 -3.07 -15.9 -0.25 -3.07 -16.43 -0.25 -1.17
  [4,15,-18.8,-0.25,-1.17,-19.34,-0.25,-3.07,-15.9,-0.25,-3.07,-16.43,-0.25,-1.17],
// 4 15 -22.28 -0.25 -5.18 -19.34 -0.25 -3.07 -18.8 -0.25 -1.17 -19 -0.25 5.15
  [4,15,-22.28,-0.25,-5.18,-19.34,-0.25,-3.07,-18.8,-0.25,-1.17,-19,-0.25,5.15],
// 3 15 -19 -0.25 5.15 -18.8 -0.25 -1.17 -17.62 -0.25 3.43
  [3,15,-19,-0.25,5.15,-18.8,-0.25,-1.17,-17.62,-0.25,3.43],
// 4 15 -16.43 -0.25 -1.17 -15.9 -0.25 -3.07 -12.89 -0.25 -5.18 -16.17 -0.25 5.15
  [4,15,-16.43,-0.25,-1.17,-15.9,-0.25,-3.07,-12.89,-0.25,-5.18,-16.17,-0.25,5.15],
// 3 15 -15.9 -0.25 -3.07 -15.3 -0.25 -5.18 -12.89 -0.25 -5.18
  [3,15,-15.9,-0.25,-3.07,-15.3,-0.25,-5.18,-12.89,-0.25,-5.18],
// 3 15 -16.17 -0.25 5.15 -17.62 -0.25 3.43 -16.43 -0.25 -1.17
  [3,15,-16.17,-0.25,5.15,-17.62,-0.25,3.43,-16.43,-0.25,-1.17],
// 3 15 -16.17 -0.25 5.15 -19 -0.25 5.15 -17.62 -0.25 3.43
  [3,15,-16.17,-0.25,5.15,-19,-0.25,5.15,-17.62,-0.25,3.43],
// 4 15 -10.74 -0.25 3.18 -6.14 -0.25 5.06 -13.12 -0.25 5.06 -13.12 -0.25 3.18
  [4,15,-10.74,-0.25,3.18,-6.14,-0.25,5.06,-13.12,-0.25,5.06,-13.12,-0.25,3.18],
// 4 15 -10.74 -0.25 3.18 -10.74 -0.25 -5.16 -8.51 -0.25 -5.16 -8.51 -0.25 3.18
  [4,15,-10.74,-0.25,3.18,-10.74,-0.25,-5.16,-8.51,-0.25,-5.16,-8.51,-0.25,3.18],
// 3 15 -6.14 -0.25 5.06 -8.51 -0.25 3.18 -6.14 -0.25 3.18
  [3,15,-6.14,-0.25,5.06,-8.51,-0.25,3.18,-6.14,-0.25,3.18],
// 3 15 -6.14 -0.25 5.06 -10.74 -0.25 3.18 -8.51 -0.25 3.18
  [3,15,-6.14,-0.25,5.06,-10.74,-0.25,3.18,-8.51,-0.25,3.18],
// 3 0 -32.16 -0.25 1.8 -32.59 -0.25 -5.22 -29.84 -0.25 -5.11
  [3,0,-32.16,-0.25,1.8,-32.59,-0.25,-5.22,-29.84,-0.25,-5.11],
// 3 0 -26.08 -0.25 1.8 -28.51 -0.25 -5.11 -25.52 -0.25 -5.22
  [3,0,-26.08,-0.25,1.8,-28.51,-0.25,-5.11,-25.52,-0.25,-5.22],
// 4 0 -24.3 -0.25 5.11 -23.28 -0.25 -5.22 -22.28 -0.25 -5.18 -19 -0.25 5.15
  [4,0,-24.3,-0.25,5.11,-23.28,-0.25,-5.22,-22.28,-0.25,-5.18,-19,-0.25,5.15],
// 4 0 -13.12 -0.25 3.18 -16.17 -0.25 5.15 -12.89 -0.25 -5.18 -10.74 -0.25 -5.16
  [4,0,-13.12,-0.25,3.18,-16.17,-0.25,5.15,-12.89,-0.25,-5.18,-10.74,-0.25,-5.16],
// 4 0 -19.93 -0.25 -5.18 -15.3 -0.25 -5.18 -15.9 -0.25 -3.07 -19.34 -0.25 -3.07
  [4,0,-19.93,-0.25,-5.18,-15.3,-0.25,-5.18,-15.9,-0.25,-3.07,-19.34,-0.25,-3.07],
// 3 0 -17.62 -0.25 3.43 -18.8 -0.25 -1.17 -16.43 -0.25 -1.17
  [3,0,-17.62,-0.25,3.43,-18.8,-0.25,-1.17,-16.43,-0.25,-1.17],
// 4 0 -31.53 -0.25 5.11 -30.15 -0.25 1.31 -28.15 -0.25 1.37 -26.76 -0.25 5.11
  [4,0,-31.53,-0.25,5.11,-30.15,-0.25,1.31,-28.15,-0.25,1.37,-26.76,-0.25,5.11],
// 3 0 -28.15 -0.25 1.37 -30.15 -0.25 1.31 -29.17 -0.25 -1.75
  [3,0,-28.15,-0.25,1.37,-30.15,-0.25,1.31,-29.17,-0.25,-1.75],
// 3 0 -10.74 -0.25 3.18 -13.12 -0.25 3.18 -10.74 -0.25 -5.16
  [3,0,-10.74,-0.25,3.18,-13.12,-0.25,3.18,-10.74,-0.25,-5.16],
// 4 0 -6.14 -0.25 3.18 -8.51 -0.25 3.18 -8.51 -0.25 -5.16 2.45 -0.25 -3.46
  [4,0,-6.14,-0.25,3.18,-8.51,-0.25,3.18,-8.51,-0.25,-5.16,2.45,-0.25,-3.46],
// 3 0 -16.17 -0.25 5.15 -13.12 -0.25 3.18 -13.12 -0.25 5.06
  [3,0,-16.17,-0.25,5.15,-13.12,-0.25,3.18,-13.12,-0.25,5.06],
// 4 0 -38 -0.25 8 -38 -0.25 -8 -34.84 -0.25 -5.22 -33.99 -0.25 5.11
  [4,0,-38,-0.25,8,-38,-0.25,-8,-34.84,-0.25,-5.22,-33.99,-0.25,5.11],
// 3 0 -38 -0.25 8 -33.99 -0.25 5.11 -31.53 -0.25 5.11
  [3,0,-38,-0.25,8,-33.99,-0.25,5.11,-31.53,-0.25,5.11],
// 3 0 -38 -0.25 8 -31.53 -0.25 5.11 -26.76 -0.25 5.11
  [3,0,-38,-0.25,8,-31.53,-0.25,5.11,-26.76,-0.25,5.11],
// 4 0 -38 -0.25 8 -26.76 -0.25 5.11 -24.3 -0.25 5.11 -19 -0.25 5.15
  [4,0,-38,-0.25,8,-26.76,-0.25,5.11,-24.3,-0.25,5.11,-19,-0.25,5.15],
// 3 0 -38 -0.25 8 -19 -0.25 5.15 -16.17 -0.25 5.15
  [3,0,-38,-0.25,8,-19,-0.25,5.15,-16.17,-0.25,5.15],
// 4 0 -38 -0.25 8 -16.17 -0.25 5.15 -13.12 -0.25 5.06 -6.14 -0.25 5.06
  [4,0,-38,-0.25,8,-16.17,-0.25,5.15,-13.12,-0.25,5.06,-6.14,-0.25,5.06],
// 4 0 38 -0.25 8 -38 -0.25 8 -6.14 -0.25 5.06 5.41 -0.25 5.05
  [4,0,38,-0.25,8,-38,-0.25,8,-6.14,-0.25,5.06,5.41,-0.25,5.05],
// 4 0 -6.14 -0.25 5.06 -6.14 -0.25 3.18 2.62 -0.25 4.15 3.88 -0.25 4.79
  [4,0,-6.14,-0.25,5.06,-6.14,-0.25,3.18,2.62,-0.25,4.15,3.88,-0.25,4.79],
// 3 0 -6.14 -0.25 5.06 3.88 -0.25 4.79 5.41 -0.25 5.05
  [3,0,-6.14,-0.25,5.06,3.88,-0.25,4.79,5.41,-0.25,5.05],
// 3 0 38 -0.25 8 10.88 -0.25 4.93 17.36 -0.25 4.93
  [3,0,38,-0.25,8,10.88,-0.25,4.93,17.36,-0.25,4.93],
// 3 0 38 -0.25 8 27.93 -0.25 5.22 31.79 -0.25 5.22
  [3,0,38,-0.25,8,27.93,-0.25,5.22,31.79,-0.25,5.22],
// 3 0 38 -0.25 8 31.79 -0.25 5.22 33.23 -0.25 5.02
  [3,0,38,-0.25,8,31.79,-0.25,5.22,33.23,-0.25,5.02],
// 3 0 38 -0.25 8 33.23 -0.25 5.02 34.27 -0.25 4.41
  [3,0,38,-0.25,8,33.23,-0.25,5.02,34.27,-0.25,4.41],
// 3 0 38 -0.25 8 34.27 -0.25 4.41 34.91 -0.25 3.49
  [3,0,38,-0.25,8,34.27,-0.25,4.41,34.91,-0.25,3.49],
// 3 0 38 -0.25 8 34.91 -0.25 3.49 35.13 -0.25 2.34
  [3,0,38,-0.25,8,34.91,-0.25,3.49,35.13,-0.25,2.34],
// 4 0 38 -0.25 8 35.13 -0.25 2.34 35.17 -0.25 -1.26 38 -0.25 -8
  [4,0,38,-0.25,8,35.13,-0.25,2.34,35.17,-0.25,-1.26,38,-0.25,-8],
// 3 0 35.17 -0.25 -1.26 35.36 -0.25 -2.38 38 -0.25 -8
  [3,0,35.17,-0.25,-1.26,35.36,-0.25,-2.38,38,-0.25,-8],
// 3 0 35.36 -0.25 -2.38 35.15 -0.25 -3.51 38 -0.25 -8
  [3,0,35.36,-0.25,-2.38,35.15,-0.25,-3.51,38,-0.25,-8],
// 3 0 35.15 -0.25 -3.51 34.52 -0.25 -4.41 38 -0.25 -8
  [3,0,35.15,-0.25,-3.51,34.52,-0.25,-4.41,38,-0.25,-8],
// 3 0 34.52 -0.25 -4.41 33.52 -0.25 -5.01 38 -0.25 -8
  [3,0,34.52,-0.25,-4.41,33.52,-0.25,-5.01,38,-0.25,-8],
// 3 0 33.52 -0.25 -5.01 32.21 -0.25 -5.21 38 -0.25 -8
  [3,0,33.52,-0.25,-5.01,32.21,-0.25,-5.21,38,-0.25,-8],
// 3 0 27.93 -0.25 -5.21 38 -0.25 -8 32.21 -0.25 -5.21
  [3,0,27.93,-0.25,-5.21,38,-0.25,-8,32.21,-0.25,-5.21],
// 3 0 11.35 -0.25 -5.21 38 -0.25 -8 13.62 -0.25 -5.21
  [3,0,11.35,-0.25,-5.21,38,-0.25,-8,13.62,-0.25,-5.21],
// 3 0 11.35 -0.25 -5.21 8.87 -0.25 -5.21 38 -0.25 -8
  [3,0,11.35,-0.25,-5.21,8.87,-0.25,-5.21,38,-0.25,-8],
// 3 0 2.45 -0.25 -5.21 38 -0.25 -8 8.87 -0.25 -5.21
  [3,0,2.45,-0.25,-5.21,38,-0.25,-8,8.87,-0.25,-5.21],
// 4 0 38 -0.25 -8 2.45 -0.25 -5.21 -8.51 -0.25 -5.16 -38 -0.25 -8
  [4,0,38,-0.25,-8,2.45,-0.25,-5.21,-8.51,-0.25,-5.16,-38,-0.25,-8],
// 4 0 2.62 -0.25 1.97 2.62 -0.25 4.15 -6.14 -0.25 3.18 2.45 -0.25 -3.46
  [4,0,2.62,-0.25,1.97,2.62,-0.25,4.15,-6.14,-0.25,3.18,2.45,-0.25,-3.46],
// 3 0 2.45 -0.25 -3.46 -8.51 -0.25 -5.16 2.45 -0.25 -5.21
  [3,0,2.45,-0.25,-3.46,-8.51,-0.25,-5.16,2.45,-0.25,-5.21],
// 3 0 -34.84 -0.25 -5.22 -38 -0.25 -8 -32.59 -0.25 -5.22
  [3,0,-34.84,-0.25,-5.22,-38,-0.25,-8,-32.59,-0.25,-5.22],
// 4 0 -29.84 -0.25 -5.11 -32.59 -0.25 -5.22 -38 -0.25 -8 -28.51 -0.25 -5.11
  [4,0,-29.84,-0.25,-5.11,-32.59,-0.25,-5.22,-38,-0.25,-8,-28.51,-0.25,-5.11],
// 3 0 -28.51 -0.25 -5.11 -38 -0.25 -8 -25.52 -0.25 -5.22
  [3,0,-28.51,-0.25,-5.11,-38,-0.25,-8,-25.52,-0.25,-5.22],
// 3 0 -23.28 -0.25 -5.22 -25.52 -0.25 -5.22 -38 -0.25 -8
  [3,0,-23.28,-0.25,-5.22,-25.52,-0.25,-5.22,-38,-0.25,-8],
// 4 0 -22.28 -0.25 -5.18 -23.28 -0.25 -5.22 -38 -0.25 -8 -19.93 -0.25 -5.18
  [4,0,-22.28,-0.25,-5.18,-23.28,-0.25,-5.22,-38,-0.25,-8,-19.93,-0.25,-5.18],
// 3 0 -19.93 -0.25 -5.18 -38 -0.25 -8 -15.3 -0.25 -5.18
  [3,0,-19.93,-0.25,-5.18,-38,-0.25,-8,-15.3,-0.25,-5.18],
// 3 0 -15.3 -0.25 -5.18 -38 -0.25 -8 -12.89 -0.25 -5.18
  [3,0,-15.3,-0.25,-5.18,-38,-0.25,-8,-12.89,-0.25,-5.18],
// 4 0 -10.74 -0.25 -5.16 -12.89 -0.25 -5.18 -38 -0.25 -8 -8.51 -0.25 -5.16
  [4,0,-10.74,-0.25,-5.16,-12.89,-0.25,-5.18,-38,-0.25,-8,-8.51,-0.25,-5.16],
];
makepoly(ldraw_lib__6153754i(), line=0.2);
